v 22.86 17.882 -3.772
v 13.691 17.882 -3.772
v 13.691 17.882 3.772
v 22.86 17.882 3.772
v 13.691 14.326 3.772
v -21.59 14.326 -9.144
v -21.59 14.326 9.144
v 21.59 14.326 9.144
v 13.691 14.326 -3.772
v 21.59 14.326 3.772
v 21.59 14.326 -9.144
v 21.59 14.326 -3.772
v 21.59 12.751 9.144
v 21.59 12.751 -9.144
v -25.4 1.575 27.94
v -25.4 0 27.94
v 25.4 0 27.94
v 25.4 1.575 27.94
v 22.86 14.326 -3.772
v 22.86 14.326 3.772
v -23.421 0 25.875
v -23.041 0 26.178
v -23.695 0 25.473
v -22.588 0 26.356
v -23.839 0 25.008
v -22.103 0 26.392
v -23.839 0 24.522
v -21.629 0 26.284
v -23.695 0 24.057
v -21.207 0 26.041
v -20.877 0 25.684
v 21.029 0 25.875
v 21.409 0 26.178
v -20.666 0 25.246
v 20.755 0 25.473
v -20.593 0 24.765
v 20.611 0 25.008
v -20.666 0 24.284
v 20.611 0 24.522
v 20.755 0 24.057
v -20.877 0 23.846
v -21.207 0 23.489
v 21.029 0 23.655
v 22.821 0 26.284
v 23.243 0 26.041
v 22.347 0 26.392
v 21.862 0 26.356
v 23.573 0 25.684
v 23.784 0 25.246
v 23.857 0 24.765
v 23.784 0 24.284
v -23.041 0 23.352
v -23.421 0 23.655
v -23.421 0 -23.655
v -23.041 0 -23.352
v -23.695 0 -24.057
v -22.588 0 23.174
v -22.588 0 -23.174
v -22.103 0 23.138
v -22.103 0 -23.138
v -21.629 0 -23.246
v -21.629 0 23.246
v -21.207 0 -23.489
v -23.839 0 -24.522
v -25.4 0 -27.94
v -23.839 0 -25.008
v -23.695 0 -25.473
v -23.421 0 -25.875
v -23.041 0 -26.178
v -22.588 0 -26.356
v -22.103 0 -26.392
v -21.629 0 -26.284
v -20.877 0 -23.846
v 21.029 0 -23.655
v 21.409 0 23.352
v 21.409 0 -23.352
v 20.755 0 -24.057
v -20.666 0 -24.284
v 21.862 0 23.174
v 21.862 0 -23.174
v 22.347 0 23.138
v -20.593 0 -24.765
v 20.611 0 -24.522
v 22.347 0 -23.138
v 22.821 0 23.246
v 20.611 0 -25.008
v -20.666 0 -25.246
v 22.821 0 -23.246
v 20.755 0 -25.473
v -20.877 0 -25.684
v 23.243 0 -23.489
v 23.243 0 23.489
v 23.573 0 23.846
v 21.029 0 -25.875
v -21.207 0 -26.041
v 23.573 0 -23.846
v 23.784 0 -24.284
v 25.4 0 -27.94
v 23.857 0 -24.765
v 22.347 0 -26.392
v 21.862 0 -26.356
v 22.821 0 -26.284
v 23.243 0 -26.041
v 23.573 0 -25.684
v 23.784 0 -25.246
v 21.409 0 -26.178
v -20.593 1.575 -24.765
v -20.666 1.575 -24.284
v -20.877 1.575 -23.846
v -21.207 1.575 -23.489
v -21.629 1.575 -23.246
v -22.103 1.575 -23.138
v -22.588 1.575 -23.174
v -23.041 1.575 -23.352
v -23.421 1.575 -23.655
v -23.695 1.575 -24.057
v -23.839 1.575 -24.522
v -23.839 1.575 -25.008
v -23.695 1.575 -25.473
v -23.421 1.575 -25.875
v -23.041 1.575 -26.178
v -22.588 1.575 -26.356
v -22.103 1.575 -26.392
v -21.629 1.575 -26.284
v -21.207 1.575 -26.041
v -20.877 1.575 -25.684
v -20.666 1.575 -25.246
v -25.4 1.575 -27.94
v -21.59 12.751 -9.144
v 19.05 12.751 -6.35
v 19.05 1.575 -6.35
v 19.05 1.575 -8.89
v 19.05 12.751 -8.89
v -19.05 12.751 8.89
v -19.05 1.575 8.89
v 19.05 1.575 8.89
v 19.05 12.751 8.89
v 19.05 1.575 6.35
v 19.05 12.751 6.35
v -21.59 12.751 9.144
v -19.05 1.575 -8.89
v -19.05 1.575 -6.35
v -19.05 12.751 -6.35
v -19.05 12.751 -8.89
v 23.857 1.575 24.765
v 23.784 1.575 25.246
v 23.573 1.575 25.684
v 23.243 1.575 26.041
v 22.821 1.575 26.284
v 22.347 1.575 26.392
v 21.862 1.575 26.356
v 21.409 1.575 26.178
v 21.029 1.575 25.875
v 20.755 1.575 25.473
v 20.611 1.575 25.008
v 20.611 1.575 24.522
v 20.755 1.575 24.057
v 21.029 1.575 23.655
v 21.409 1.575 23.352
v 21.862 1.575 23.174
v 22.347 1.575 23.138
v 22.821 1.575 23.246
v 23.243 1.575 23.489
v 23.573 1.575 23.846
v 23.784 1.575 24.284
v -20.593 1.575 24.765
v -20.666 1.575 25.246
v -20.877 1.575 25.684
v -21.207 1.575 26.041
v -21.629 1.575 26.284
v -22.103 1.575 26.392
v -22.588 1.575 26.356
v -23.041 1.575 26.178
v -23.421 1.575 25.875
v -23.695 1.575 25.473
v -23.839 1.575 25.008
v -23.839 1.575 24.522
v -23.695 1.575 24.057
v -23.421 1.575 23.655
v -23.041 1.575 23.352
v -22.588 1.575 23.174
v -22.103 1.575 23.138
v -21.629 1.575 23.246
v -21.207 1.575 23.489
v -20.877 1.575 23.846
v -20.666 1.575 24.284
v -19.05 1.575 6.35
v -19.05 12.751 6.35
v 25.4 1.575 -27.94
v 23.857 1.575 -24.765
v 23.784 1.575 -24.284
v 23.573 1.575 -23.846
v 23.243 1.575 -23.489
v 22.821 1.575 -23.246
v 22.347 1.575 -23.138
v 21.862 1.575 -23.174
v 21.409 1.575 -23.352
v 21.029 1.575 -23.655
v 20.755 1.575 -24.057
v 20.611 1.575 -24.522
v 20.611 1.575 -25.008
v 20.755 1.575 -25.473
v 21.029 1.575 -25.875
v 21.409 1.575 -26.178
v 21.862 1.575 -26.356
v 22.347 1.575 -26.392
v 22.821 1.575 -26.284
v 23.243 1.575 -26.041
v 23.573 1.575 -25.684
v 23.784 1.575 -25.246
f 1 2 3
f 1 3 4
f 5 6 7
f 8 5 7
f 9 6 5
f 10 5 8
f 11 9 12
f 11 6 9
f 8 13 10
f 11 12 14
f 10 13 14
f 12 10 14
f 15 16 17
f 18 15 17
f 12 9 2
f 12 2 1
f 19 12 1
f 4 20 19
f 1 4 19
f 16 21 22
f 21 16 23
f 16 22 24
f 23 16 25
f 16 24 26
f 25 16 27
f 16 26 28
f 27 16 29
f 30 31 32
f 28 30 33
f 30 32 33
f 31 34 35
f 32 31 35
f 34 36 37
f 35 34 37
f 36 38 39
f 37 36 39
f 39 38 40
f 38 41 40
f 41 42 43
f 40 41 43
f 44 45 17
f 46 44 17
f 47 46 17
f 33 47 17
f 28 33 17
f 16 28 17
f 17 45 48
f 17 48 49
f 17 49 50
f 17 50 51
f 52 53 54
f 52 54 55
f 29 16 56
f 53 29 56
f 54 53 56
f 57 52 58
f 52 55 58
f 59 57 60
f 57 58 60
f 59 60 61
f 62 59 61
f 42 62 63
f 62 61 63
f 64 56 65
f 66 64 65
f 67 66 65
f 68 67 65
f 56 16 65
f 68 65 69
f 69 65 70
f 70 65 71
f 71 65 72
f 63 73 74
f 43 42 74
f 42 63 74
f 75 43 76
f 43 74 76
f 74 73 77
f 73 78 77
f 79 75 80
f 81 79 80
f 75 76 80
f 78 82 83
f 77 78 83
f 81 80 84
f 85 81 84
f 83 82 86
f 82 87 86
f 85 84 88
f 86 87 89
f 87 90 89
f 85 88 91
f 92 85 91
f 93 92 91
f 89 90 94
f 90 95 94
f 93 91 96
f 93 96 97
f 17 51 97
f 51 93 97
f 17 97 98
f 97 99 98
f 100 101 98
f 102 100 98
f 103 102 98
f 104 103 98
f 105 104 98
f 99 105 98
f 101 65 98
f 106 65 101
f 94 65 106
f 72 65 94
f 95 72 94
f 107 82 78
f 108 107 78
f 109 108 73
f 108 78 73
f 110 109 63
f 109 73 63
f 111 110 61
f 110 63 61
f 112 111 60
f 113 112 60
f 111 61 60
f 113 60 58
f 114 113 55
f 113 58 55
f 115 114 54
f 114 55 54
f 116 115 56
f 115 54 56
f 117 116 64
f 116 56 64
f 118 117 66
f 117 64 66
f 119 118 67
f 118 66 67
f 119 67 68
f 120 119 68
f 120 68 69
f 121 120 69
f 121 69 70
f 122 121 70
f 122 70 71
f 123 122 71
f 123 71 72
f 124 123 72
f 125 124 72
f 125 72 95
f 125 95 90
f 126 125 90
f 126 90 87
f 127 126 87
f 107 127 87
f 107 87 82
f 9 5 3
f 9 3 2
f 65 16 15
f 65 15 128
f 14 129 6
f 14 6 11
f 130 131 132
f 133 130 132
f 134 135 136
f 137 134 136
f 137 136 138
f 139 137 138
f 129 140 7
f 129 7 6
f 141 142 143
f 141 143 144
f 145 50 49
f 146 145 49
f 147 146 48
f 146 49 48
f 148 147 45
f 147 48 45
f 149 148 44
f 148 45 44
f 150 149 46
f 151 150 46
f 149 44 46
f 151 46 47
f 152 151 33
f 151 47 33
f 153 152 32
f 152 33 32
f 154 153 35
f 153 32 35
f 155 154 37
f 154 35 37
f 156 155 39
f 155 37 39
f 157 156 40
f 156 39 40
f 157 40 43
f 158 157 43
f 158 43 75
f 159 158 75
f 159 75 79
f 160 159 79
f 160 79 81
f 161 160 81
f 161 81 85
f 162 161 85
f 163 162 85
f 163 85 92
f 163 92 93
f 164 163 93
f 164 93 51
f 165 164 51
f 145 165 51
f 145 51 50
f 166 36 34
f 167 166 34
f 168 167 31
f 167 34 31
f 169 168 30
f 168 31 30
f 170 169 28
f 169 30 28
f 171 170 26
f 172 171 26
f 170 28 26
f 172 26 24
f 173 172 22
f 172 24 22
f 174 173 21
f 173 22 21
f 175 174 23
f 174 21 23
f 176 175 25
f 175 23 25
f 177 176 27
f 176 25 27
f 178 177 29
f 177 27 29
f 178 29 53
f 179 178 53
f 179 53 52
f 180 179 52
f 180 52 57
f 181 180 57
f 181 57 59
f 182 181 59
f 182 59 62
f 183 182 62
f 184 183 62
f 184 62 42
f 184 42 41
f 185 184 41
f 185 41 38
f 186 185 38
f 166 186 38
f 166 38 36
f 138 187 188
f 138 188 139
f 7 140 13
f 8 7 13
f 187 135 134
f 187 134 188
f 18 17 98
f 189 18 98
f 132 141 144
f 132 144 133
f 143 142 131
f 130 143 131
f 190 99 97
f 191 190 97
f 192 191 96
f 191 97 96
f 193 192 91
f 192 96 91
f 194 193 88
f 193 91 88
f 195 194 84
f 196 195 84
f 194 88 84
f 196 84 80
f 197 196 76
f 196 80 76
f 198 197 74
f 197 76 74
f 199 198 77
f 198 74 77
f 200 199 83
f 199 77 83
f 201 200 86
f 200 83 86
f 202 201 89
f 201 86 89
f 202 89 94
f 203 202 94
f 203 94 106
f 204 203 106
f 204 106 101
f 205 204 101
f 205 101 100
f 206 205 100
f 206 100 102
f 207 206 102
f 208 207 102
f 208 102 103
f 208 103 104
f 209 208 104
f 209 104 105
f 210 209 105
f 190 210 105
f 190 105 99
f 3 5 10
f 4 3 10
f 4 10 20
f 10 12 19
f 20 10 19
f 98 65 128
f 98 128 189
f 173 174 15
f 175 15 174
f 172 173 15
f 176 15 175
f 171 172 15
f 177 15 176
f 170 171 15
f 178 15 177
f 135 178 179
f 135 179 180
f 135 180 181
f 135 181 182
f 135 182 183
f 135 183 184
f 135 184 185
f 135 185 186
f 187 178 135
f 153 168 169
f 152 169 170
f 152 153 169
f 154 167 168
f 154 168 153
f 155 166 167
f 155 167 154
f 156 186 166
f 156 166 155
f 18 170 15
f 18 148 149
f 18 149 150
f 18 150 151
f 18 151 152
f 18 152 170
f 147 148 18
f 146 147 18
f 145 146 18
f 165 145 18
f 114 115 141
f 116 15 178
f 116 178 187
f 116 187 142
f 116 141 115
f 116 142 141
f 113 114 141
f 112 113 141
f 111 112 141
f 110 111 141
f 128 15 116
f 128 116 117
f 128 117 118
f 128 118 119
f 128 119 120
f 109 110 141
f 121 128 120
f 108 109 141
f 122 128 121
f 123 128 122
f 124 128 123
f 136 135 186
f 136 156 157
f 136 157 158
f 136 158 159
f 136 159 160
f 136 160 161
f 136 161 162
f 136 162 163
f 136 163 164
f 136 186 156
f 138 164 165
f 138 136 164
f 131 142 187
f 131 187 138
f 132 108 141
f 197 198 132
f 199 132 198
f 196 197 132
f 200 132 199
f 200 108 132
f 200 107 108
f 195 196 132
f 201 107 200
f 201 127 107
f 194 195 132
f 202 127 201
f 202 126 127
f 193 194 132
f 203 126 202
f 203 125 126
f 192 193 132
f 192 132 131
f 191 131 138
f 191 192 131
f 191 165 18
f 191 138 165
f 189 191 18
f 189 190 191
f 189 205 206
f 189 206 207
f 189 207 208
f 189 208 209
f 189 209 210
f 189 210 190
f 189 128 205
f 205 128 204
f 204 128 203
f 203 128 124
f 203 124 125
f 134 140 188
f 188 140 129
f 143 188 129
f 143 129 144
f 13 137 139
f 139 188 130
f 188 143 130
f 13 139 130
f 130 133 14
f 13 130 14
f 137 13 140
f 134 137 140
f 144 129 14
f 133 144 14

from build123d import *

# Parameters (mm, degrees)
SKETCH1_W                 = 50.8
SKETCH1_H                 = 55.88
BOSS_EXTRUDE1_DEPTH       = 1.5748
F_4_CLEARANCE_HOLE1_D     = 3.2639
F_4_CLEARANCE_HOLE1_DEPTH = 76.2
F_4_CLEARANCE_HOLE1_TIP   = 0.980574487
SKETCH4_W                 = 38.1
SKETCH4_H                 = 2.54
BOSS_EXTRUDE2_DEPTH       = 11.176
SKETCH5_W                 = 43.18
SKETCH5_H                 = 18.288
BOSS_EXTRUDE3_DEPTH       = 1.5748
SKETCH6_W                 = 9.1694
SKETCH6_H                 = 7.5438
BOSS_EXTRUDE4_DEPTH       = 3.556


with BuildPart() as part:
    # Sketch1 → Boss-Extrude1 (new body)
    with BuildSketch(Plane(origin=(0, 0, 0), x_dir=(1, 0, 0), z_dir=(0, 1, 0))):
        Rectangle(SKETCH1_W, SKETCH1_H)
    extrude(amount=BOSS_EXTRUDE1_DEPTH)

    # #4 Clearance Hole1
    with Locations(Plane(origin=(0, 1.5748, 0), x_dir=(-1, 0, 0), z_dir=(0, 1, 0))):
        with Locations((22.225, 24.765), (22.225, -24.765), (-22.225, -24.765), (-22.225, 24.765)):
            Hole(F_4_CLEARANCE_HOLE1_D / 2, depth=F_4_CLEARANCE_HOLE1_DEPTH)
            with Locations((0, 0, -(F_4_CLEARANCE_HOLE1_DEPTH + F_4_CLEARANCE_HOLE1_TIP / 2))):  # 118° drill point
                Cone(0, F_4_CLEARANCE_HOLE1_D / 2, F_4_CLEARANCE_HOLE1_TIP, mode=Mode.SUBTRACT)

    # Sketch4 → Boss-Extrude2 (add)
    with BuildSketch(Plane(origin=(0, 1.5748, 0), x_dir=(1, 0, 0), z_dir=(0, 1, 0))):
        with Locations((0, -7.62)):
            Rectangle(SKETCH4_W, SKETCH4_H)
        with Locations((0, 7.62)):
            Rectangle(SKETCH4_W, SKETCH4_H)
    extrude(amount=BOSS_EXTRUDE2_DEPTH)

    # Sketch5 → Boss-Extrude3 (add)
    with BuildSketch(Plane(origin=(0, 12.7508, 0), x_dir=(1, 0, 0), z_dir=(0, 1, 0))):
        Rectangle(SKETCH5_W, SKETCH5_H)
    extrude(amount=BOSS_EXTRUDE3_DEPTH)

    # Sketch6 → Boss-Extrude4 (add)
    with BuildSketch(Plane(origin=(0, 14.3256, 0), x_dir=(1, 0, 0), z_dir=(0, 1, 0))):
        with Locations((18.2753, 0)):
            Rectangle(SKETCH6_W, SKETCH6_H)
    extrude(amount=BOSS_EXTRUDE4_DEPTH)


solid = part.part
